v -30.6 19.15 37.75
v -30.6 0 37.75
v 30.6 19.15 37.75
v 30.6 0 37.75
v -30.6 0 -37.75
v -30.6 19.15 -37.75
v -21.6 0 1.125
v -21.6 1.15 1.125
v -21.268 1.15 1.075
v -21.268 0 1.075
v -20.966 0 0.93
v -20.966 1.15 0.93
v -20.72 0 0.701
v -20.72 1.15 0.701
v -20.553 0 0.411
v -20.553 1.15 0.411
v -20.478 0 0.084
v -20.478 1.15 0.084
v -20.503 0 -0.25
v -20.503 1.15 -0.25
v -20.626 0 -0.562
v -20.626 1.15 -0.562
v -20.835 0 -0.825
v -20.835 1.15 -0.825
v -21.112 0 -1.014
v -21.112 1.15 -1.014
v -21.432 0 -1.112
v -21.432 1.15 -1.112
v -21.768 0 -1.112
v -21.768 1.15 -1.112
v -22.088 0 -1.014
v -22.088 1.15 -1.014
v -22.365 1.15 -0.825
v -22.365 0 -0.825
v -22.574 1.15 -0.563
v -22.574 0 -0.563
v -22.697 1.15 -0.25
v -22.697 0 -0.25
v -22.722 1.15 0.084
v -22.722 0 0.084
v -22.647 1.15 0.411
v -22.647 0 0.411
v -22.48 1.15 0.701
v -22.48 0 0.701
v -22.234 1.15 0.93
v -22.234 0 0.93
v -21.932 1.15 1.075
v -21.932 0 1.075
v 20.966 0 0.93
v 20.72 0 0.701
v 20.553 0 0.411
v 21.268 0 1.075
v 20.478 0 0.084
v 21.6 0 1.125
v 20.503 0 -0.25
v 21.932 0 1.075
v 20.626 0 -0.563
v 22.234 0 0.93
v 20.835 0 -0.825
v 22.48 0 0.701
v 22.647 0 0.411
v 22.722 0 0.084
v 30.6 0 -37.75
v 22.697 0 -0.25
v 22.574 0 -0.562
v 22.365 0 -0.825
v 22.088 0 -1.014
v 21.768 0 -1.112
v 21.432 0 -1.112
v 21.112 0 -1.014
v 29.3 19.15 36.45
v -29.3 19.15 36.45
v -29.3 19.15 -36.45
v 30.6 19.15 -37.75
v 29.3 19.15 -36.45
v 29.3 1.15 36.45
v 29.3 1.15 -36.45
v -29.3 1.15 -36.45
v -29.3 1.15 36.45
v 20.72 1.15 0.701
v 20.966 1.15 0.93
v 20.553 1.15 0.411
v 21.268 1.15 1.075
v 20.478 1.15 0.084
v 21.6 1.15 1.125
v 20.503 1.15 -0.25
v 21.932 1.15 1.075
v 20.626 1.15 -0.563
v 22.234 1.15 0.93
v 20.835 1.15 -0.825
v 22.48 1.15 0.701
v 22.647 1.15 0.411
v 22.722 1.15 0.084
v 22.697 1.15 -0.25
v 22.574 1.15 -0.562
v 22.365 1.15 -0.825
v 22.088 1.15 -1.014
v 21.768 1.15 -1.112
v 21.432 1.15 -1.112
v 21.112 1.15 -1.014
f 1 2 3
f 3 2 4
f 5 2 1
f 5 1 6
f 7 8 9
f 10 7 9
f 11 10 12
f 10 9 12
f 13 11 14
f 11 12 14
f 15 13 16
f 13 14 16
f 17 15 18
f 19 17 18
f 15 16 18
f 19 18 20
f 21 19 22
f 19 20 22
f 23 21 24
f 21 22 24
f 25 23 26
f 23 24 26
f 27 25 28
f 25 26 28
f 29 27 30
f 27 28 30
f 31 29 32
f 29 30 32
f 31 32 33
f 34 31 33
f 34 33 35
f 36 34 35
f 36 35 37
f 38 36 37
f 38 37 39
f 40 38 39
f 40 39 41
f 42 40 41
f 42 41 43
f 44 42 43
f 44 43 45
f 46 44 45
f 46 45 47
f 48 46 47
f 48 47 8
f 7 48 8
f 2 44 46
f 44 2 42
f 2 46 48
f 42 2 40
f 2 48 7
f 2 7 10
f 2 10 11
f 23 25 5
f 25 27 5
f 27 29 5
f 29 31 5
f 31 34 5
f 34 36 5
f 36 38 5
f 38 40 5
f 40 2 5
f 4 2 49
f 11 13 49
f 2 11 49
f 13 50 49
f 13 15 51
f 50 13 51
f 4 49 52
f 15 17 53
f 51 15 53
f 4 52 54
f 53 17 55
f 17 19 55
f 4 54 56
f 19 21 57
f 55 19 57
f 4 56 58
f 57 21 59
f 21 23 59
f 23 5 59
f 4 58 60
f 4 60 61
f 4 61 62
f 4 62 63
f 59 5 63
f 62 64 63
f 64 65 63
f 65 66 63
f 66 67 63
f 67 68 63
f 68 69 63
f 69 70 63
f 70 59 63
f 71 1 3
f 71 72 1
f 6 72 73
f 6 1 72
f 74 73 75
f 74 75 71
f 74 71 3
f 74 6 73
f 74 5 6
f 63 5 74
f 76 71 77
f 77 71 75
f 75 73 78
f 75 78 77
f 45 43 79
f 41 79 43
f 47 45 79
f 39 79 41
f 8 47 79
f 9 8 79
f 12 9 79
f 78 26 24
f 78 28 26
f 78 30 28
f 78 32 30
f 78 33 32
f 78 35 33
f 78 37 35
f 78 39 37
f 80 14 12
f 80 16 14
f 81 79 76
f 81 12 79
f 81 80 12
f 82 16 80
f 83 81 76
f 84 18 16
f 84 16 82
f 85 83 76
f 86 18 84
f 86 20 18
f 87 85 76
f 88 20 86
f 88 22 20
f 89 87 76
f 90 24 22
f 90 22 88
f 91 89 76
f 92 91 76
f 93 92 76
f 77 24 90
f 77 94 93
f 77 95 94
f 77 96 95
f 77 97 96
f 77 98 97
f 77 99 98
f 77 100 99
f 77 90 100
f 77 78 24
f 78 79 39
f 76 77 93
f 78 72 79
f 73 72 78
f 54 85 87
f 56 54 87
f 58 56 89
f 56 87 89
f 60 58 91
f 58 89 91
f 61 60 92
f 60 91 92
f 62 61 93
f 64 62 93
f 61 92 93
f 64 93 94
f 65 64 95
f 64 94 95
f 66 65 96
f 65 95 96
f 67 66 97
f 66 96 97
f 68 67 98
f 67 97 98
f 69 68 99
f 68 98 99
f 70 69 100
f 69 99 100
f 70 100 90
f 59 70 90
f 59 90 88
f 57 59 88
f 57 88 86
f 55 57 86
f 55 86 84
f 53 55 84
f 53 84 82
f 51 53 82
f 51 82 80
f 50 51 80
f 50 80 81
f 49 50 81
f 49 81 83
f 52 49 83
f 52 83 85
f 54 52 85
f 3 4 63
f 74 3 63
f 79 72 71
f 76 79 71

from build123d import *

# Parameters (mm, degrees)
SKETCH1_W           = 61.2
SKETCH1_H           = 75.5
BOSS_EXTRUDE1_DEPTH = 19.15
SKETCH2_W           = 58.6
SKETCH2_H           = 72.89934915
CUT_EXTRUDE1_DEPTH  = 18
SKETCH3_R           = 1.125
CUT_EXTRUDE2_DEPTH  = 20


with BuildPart() as part:
    # Sketch1 → Boss-Extrude1 (new body)
    with BuildSketch(Plane(origin=(0, 0, 0), x_dir=(1, 0, 0), z_dir=(0, 1, 0))):
        Rectangle(SKETCH1_W, SKETCH1_H)
    extrude(amount=BOSS_EXTRUDE1_DEPTH)

    # Sketch2 → Cut-Extrude1 (cut)
    with BuildSketch(Plane(origin=(0, 19.15, 0), x_dir=(1, 0, 0), z_dir=(0, 1, 0))):
        Rectangle(SKETCH2_W, SKETCH2_H)
    extrude(amount=-CUT_EXTRUDE1_DEPTH, mode=Mode.SUBTRACT)

    # Sketch3 → Cut-Extrude2 (cut)
    with BuildSketch(Plane(origin=(0, 1.15, 0), x_dir=(1, 0, 0), z_dir=(0, 1, 0))):
        with Locations(Location((-21.6, 0, 0), (0, 0, 270))):
            Circle(SKETCH3_R)
        with Locations(Location((21.6, 0, 0), (0, 0, 270))):
            Circle(SKETCH3_R)
    extrude(amount=-CUT_EXTRUDE2_DEPTH, mode=Mode.SUBTRACT)


solid = part.part
